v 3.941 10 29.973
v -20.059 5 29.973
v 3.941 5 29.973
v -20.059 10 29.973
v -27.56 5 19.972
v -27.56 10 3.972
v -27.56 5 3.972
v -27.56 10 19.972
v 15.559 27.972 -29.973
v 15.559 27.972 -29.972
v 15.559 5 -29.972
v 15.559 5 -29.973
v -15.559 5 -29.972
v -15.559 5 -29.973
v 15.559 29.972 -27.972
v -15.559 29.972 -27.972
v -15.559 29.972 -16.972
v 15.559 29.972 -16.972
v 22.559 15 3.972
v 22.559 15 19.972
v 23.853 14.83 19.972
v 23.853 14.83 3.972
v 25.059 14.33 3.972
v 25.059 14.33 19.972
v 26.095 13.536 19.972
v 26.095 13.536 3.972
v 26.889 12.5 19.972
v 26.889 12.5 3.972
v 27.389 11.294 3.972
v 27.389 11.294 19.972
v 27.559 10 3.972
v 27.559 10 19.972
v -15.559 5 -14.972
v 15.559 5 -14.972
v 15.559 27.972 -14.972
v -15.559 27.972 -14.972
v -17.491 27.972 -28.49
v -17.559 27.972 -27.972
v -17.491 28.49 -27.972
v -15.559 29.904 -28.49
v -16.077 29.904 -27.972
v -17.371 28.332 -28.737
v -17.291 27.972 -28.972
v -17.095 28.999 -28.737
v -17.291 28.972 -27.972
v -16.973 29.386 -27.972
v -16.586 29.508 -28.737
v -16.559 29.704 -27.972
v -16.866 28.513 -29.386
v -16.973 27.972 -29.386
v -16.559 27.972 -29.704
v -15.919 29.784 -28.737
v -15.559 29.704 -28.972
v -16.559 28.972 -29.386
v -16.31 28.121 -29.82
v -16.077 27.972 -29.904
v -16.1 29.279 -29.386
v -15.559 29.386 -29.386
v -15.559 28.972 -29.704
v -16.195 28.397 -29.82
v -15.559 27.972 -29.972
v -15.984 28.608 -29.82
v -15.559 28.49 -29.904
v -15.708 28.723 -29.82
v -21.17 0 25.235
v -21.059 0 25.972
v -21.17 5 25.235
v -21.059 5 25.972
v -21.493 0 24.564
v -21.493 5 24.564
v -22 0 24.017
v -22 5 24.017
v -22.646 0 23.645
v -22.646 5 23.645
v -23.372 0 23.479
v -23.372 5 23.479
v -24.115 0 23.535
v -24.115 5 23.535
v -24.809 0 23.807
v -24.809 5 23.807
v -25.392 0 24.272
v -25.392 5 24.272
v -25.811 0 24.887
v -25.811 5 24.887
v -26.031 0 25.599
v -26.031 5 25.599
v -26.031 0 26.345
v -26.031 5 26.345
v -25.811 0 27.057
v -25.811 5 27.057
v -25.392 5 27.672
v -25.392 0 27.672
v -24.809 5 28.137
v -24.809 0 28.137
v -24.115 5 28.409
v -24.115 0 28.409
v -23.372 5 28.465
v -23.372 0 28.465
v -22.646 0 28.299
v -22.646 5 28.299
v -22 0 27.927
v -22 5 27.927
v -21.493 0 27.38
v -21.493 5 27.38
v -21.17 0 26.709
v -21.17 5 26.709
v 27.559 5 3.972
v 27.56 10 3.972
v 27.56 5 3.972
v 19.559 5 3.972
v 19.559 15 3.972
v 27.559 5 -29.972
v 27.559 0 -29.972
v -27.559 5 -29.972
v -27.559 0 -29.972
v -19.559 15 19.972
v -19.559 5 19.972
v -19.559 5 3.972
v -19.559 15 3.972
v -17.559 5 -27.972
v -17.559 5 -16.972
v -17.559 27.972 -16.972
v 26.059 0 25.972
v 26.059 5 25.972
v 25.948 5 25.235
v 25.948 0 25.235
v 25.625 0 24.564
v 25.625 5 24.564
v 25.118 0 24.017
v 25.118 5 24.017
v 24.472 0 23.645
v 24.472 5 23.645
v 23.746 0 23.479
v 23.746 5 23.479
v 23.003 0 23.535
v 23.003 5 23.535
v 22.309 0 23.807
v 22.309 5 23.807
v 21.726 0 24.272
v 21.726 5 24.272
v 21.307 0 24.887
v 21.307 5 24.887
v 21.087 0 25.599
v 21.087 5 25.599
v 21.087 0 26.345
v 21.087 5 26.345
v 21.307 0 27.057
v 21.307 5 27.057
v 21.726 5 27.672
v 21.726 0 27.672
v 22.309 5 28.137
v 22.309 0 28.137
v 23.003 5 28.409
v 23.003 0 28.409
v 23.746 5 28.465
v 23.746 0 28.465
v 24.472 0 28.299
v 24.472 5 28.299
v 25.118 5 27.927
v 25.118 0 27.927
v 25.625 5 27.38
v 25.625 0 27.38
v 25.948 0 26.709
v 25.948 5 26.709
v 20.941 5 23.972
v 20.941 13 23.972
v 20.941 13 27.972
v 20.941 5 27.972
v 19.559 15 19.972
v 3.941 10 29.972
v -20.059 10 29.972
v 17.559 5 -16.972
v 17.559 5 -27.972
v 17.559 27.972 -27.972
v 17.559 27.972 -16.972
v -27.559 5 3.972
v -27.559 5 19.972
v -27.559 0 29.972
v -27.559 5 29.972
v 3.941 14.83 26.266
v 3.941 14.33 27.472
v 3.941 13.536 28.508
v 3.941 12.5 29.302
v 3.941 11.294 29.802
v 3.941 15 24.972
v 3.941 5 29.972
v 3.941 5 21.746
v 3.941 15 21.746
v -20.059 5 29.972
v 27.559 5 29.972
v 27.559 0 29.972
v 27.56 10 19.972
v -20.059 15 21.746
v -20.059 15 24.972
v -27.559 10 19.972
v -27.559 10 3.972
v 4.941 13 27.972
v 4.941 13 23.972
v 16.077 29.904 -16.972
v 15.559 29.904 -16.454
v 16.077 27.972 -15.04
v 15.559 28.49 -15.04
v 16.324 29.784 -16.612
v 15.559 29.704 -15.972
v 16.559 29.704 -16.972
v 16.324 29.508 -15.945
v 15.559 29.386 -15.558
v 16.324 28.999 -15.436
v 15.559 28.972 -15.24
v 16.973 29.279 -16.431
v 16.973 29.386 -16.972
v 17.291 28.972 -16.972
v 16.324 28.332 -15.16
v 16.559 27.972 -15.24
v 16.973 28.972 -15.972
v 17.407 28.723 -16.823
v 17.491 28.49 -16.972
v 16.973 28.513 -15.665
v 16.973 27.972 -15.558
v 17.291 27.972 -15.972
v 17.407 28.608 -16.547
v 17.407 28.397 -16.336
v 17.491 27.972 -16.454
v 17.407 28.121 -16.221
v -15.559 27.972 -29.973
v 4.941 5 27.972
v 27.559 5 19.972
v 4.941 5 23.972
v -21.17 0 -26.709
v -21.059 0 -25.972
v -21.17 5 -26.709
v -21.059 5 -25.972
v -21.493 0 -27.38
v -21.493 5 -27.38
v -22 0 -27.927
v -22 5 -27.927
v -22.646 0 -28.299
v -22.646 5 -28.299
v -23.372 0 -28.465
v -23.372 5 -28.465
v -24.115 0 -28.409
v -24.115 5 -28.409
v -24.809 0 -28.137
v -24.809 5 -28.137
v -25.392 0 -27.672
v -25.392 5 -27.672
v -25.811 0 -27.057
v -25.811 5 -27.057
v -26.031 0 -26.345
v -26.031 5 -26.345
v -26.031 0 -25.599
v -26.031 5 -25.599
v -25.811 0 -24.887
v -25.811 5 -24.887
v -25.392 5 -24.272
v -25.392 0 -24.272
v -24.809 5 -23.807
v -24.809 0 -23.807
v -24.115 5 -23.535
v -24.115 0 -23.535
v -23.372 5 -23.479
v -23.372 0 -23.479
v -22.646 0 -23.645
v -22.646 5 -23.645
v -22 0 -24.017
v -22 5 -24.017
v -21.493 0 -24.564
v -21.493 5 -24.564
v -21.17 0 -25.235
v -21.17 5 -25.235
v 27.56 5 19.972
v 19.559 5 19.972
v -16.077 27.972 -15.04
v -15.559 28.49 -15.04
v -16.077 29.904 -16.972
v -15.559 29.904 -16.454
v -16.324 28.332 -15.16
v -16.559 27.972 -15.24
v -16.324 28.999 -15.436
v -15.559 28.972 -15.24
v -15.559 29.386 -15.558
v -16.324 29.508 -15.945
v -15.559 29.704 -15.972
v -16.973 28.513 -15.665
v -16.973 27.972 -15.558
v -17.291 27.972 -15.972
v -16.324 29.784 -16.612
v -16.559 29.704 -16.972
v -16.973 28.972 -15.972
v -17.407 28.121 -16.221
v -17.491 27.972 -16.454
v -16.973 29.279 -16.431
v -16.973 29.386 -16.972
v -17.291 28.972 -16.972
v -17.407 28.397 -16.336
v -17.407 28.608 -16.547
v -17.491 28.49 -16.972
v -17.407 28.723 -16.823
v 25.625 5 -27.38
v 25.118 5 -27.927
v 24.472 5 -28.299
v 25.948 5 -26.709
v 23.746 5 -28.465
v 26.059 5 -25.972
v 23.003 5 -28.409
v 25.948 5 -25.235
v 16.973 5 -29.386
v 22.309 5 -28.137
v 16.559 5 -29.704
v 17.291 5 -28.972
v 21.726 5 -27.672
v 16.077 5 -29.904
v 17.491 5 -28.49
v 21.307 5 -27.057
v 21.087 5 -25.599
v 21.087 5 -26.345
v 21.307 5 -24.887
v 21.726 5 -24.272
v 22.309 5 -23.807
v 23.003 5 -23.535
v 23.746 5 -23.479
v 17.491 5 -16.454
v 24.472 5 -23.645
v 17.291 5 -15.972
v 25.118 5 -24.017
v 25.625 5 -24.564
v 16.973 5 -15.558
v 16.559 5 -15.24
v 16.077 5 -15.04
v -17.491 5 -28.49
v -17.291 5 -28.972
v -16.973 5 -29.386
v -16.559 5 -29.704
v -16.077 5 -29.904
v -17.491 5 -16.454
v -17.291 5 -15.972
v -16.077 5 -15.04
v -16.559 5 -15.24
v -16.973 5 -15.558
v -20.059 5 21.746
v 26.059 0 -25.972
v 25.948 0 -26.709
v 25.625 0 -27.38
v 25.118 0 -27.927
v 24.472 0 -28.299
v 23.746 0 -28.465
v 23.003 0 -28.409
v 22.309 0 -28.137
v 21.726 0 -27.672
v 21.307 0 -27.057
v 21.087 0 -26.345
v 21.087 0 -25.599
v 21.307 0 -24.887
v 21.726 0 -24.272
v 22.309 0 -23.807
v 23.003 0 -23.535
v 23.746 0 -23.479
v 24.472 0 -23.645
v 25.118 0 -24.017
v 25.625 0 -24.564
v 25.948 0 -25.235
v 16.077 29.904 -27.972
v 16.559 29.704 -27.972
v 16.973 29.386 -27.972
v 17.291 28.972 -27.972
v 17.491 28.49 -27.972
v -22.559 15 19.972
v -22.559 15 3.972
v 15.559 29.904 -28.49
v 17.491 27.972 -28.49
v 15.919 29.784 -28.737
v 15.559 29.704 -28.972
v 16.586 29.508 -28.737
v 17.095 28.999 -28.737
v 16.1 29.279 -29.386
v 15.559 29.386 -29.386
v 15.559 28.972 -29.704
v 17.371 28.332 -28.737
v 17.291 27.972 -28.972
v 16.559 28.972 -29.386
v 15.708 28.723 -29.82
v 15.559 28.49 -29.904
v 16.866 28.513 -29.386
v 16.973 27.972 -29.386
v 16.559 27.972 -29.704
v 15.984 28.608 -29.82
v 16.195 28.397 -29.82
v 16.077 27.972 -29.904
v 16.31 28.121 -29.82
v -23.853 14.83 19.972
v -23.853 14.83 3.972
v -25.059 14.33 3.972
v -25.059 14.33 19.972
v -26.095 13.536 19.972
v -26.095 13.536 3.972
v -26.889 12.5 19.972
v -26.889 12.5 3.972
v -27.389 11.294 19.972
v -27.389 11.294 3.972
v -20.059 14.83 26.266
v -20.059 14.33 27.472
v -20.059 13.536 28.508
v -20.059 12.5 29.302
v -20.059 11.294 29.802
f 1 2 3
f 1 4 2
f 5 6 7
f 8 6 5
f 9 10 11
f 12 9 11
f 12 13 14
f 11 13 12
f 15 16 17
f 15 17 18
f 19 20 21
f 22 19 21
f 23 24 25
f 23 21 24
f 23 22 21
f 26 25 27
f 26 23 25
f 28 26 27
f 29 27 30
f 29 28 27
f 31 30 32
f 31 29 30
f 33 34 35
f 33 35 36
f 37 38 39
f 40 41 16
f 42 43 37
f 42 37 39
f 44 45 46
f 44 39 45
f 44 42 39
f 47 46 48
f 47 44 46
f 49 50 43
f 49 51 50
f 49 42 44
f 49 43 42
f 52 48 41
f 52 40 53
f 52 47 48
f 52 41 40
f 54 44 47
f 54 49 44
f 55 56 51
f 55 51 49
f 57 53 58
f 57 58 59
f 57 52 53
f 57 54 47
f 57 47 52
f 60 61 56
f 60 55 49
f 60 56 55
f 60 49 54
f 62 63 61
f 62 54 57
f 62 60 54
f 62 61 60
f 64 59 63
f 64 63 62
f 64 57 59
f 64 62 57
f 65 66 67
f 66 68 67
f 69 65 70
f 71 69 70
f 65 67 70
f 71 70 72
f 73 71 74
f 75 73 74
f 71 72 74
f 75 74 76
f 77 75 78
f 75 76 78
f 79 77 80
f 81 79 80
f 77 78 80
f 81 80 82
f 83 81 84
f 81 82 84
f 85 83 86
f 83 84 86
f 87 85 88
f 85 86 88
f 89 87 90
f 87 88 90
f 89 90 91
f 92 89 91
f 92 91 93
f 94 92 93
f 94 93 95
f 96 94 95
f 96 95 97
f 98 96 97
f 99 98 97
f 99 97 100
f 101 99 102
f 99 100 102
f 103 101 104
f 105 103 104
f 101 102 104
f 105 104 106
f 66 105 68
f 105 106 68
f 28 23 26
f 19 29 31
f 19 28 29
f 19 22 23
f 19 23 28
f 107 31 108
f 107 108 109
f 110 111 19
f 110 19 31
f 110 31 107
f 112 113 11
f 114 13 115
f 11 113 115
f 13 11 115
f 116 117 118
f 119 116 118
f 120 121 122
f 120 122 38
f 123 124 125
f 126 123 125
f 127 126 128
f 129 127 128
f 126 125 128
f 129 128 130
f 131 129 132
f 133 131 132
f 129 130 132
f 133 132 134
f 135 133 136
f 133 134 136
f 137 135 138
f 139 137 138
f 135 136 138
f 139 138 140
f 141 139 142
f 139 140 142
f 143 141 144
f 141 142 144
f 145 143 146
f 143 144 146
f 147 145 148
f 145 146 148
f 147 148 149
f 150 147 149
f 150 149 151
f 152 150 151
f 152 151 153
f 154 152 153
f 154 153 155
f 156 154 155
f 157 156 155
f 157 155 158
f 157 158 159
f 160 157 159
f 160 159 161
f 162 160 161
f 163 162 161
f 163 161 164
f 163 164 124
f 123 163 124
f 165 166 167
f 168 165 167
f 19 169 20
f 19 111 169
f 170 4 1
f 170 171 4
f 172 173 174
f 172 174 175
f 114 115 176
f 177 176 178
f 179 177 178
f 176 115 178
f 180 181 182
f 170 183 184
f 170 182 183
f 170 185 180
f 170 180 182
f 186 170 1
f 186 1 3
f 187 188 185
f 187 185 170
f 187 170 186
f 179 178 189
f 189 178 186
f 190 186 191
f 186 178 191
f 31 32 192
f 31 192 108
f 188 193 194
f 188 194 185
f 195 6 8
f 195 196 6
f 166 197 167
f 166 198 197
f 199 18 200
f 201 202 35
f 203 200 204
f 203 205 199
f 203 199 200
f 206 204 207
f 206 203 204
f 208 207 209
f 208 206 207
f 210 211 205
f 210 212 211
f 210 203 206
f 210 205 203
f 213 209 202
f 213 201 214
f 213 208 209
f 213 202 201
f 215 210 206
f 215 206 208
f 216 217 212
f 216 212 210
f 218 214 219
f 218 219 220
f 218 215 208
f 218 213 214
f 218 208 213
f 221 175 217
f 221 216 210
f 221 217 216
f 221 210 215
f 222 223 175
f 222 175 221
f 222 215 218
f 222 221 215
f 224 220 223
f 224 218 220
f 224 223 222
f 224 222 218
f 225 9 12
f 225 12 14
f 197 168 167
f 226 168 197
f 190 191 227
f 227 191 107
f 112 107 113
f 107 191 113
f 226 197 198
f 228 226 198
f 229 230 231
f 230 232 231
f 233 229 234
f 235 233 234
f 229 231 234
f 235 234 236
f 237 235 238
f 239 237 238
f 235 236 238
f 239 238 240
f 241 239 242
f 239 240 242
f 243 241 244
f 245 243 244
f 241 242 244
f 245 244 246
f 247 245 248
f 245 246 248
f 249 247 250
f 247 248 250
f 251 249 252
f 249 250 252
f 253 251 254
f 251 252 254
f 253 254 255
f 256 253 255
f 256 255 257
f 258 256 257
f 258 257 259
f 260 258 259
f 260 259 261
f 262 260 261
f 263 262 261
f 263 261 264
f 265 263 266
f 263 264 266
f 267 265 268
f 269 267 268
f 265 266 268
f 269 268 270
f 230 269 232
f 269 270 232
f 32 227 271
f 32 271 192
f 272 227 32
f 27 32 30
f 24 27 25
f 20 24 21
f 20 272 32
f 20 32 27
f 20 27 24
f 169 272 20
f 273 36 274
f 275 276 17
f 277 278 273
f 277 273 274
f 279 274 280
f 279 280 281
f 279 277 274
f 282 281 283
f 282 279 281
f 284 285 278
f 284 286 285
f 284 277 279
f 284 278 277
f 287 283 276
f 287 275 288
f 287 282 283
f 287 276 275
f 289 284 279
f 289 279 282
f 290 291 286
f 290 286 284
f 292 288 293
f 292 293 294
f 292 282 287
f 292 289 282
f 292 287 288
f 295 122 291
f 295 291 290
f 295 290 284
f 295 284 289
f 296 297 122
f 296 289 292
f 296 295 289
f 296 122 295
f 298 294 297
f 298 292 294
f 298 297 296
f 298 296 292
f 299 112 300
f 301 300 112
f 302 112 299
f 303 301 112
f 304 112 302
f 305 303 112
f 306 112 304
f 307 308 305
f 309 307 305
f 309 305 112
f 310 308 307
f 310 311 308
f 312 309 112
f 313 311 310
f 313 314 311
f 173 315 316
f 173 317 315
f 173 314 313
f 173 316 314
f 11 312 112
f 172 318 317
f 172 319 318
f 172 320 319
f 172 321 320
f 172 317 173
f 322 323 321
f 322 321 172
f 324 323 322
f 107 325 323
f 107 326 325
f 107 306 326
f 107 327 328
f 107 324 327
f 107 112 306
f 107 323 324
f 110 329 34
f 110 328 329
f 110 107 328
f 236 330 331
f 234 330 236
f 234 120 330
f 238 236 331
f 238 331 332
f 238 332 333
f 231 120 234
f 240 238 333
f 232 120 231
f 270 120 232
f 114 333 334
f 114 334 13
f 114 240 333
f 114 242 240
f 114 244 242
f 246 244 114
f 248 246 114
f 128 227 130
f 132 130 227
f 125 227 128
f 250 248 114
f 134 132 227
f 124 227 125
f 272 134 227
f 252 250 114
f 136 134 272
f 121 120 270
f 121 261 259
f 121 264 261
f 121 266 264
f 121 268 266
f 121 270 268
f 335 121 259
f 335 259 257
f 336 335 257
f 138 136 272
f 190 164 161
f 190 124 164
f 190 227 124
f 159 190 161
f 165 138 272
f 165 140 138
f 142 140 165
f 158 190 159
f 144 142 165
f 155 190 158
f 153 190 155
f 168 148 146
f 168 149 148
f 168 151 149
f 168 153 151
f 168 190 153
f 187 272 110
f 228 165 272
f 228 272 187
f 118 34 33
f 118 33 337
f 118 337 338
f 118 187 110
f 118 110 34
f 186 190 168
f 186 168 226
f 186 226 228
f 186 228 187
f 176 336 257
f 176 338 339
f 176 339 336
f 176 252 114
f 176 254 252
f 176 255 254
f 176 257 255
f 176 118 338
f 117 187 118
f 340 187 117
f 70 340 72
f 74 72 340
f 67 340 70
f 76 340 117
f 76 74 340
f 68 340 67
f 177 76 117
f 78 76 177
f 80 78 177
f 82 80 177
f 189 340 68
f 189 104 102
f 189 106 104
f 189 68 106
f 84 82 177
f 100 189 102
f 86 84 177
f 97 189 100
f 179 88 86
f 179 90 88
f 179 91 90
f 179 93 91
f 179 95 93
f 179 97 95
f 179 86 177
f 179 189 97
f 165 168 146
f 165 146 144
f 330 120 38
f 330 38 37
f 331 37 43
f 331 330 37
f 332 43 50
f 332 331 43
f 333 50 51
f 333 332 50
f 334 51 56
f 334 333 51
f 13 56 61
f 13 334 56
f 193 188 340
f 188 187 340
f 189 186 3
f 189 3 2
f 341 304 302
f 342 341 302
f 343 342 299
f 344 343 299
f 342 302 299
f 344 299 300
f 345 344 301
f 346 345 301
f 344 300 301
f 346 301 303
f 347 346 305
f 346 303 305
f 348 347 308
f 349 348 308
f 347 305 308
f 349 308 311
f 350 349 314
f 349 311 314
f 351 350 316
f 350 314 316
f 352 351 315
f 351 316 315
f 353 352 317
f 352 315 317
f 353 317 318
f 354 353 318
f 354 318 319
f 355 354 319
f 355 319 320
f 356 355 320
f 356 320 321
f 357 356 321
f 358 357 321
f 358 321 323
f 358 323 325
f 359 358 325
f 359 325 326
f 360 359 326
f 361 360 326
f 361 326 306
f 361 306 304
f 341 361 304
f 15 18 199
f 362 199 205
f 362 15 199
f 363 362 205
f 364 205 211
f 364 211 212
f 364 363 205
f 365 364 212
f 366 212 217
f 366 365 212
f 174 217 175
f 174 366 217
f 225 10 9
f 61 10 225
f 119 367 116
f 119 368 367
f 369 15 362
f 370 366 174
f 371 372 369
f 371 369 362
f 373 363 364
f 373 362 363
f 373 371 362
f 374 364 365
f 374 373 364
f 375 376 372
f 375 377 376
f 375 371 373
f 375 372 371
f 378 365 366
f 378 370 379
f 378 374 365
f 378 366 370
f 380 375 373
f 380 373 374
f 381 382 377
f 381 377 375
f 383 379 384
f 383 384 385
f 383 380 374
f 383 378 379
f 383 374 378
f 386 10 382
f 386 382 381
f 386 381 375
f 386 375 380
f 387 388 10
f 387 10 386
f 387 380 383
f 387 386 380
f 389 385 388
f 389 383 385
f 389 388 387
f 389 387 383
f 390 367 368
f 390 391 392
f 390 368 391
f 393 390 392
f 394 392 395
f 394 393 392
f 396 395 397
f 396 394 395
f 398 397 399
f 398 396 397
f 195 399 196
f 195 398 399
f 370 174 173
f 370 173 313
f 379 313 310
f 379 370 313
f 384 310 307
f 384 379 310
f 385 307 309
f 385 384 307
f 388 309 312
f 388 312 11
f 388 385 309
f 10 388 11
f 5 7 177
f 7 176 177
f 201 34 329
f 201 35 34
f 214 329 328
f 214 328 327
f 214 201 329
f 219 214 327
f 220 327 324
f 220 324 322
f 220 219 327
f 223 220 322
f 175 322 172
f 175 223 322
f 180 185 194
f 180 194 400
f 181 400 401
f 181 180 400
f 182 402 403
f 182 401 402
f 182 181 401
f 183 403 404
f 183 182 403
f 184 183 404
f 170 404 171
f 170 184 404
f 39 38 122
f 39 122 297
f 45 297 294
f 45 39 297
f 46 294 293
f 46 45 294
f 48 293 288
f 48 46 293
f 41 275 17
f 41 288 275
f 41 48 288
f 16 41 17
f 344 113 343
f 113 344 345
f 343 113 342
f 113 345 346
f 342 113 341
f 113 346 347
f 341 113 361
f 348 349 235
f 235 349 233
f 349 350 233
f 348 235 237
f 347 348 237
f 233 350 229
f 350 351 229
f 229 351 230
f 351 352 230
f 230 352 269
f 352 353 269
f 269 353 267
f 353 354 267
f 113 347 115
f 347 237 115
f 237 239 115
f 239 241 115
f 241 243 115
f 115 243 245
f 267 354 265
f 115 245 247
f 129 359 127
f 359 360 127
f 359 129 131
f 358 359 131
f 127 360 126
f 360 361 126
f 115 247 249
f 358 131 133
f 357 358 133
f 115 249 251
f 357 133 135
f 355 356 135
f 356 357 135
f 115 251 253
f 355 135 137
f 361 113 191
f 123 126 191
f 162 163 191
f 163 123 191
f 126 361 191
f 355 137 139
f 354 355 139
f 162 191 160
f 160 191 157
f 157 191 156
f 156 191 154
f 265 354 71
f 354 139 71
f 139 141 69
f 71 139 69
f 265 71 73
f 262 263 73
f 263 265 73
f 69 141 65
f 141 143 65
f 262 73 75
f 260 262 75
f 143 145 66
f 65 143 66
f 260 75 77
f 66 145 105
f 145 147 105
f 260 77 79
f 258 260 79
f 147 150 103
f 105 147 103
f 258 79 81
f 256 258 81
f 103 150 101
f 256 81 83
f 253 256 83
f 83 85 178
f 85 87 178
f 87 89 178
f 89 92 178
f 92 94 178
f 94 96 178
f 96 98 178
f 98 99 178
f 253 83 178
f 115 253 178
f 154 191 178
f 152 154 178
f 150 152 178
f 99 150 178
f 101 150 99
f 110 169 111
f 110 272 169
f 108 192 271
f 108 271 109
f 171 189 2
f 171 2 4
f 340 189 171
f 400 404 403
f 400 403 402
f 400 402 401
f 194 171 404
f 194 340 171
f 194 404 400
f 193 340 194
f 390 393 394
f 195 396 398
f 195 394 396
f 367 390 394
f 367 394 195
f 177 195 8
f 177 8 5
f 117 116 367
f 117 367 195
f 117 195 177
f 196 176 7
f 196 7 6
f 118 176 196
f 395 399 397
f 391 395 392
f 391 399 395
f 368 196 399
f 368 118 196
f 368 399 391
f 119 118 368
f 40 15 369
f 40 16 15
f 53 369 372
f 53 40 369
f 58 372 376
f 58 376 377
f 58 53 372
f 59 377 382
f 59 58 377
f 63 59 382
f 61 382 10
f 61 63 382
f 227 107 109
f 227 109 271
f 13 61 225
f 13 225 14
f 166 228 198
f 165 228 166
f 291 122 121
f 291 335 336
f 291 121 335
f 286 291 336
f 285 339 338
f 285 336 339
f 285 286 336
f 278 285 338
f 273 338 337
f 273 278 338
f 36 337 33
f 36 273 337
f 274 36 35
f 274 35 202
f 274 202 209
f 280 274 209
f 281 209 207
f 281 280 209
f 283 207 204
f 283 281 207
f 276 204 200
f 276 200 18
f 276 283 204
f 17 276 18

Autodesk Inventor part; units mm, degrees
ref_plane "YZ Plane" through (0, 0, 0) normal (1, 0, 0) x (0, 1, 0)
ref_plane "XZ Plane" through (0, 0, 0) normal (0, 1, 0) x (-1, 0, 0)
ref_plane "XY Plane" through (0, 0, 0) normal (0, 0, 1) x (1, 0, 0)
sketch "Boceto1" plane through (0, 0, 0) normal (0, 1, 0) x (-1, 0, 0)
  line L0 (27.559, 29.972) -> (-27.559, 29.972)
  line L1 (-27.559, 29.972) -> (-27.559, -29.972)
  line L2 (-27.559, -29.972) -> (27.559, -29.972)
  line L3 (27.559, -29.972) -> (27.559, 29.972)
  point P0 (0, 0)
  point P1 (0, -29.972)
  point P2 (0, 29.972)
  dimension "d0" = 59.944
  dimension "d1" = 55.118
  dimension "d44" = 29.972
  dimension "d45" = 27.559
extrude "Extrusión1" add sketch "Boceto1" along normal blind 5
sketch "Boceto2" plane through (0, 5, 0) normal (0, 1, 0) x (1, 0, 0)
  line L0 (27.559, 29.972) -> (-27.559, 29.972) projected
  line L1 (-17.559, 29.972) -> (17.559, 29.972)
  line L2 (17.559, 29.972) -> (17.559, 14.972)
  line L3 (17.559, 14.972) -> (-17.559, 14.972)
  line L4 (-17.559, 14.972) -> (-17.559, 29.972)
  line L5 (-27.559, 29.972) -> (-27.559, -29.972) projected
  line L6 (27.559, -29.972) -> (27.559, 29.972) projected
  point P0 (0, 0)
  point P1 (17.559, 22.472)
  point P2 (17.559, 29.972)
  dimension "d4" = 10
  dimension "d5" = 10
  dimension "d6" = 15
extrude "Extrusión2" add sketch "Boceto2" along normal blind 24.972
sketch "Boceto3" plane through (0, 5, 0) normal (0, 1, 0) x (1, 0, 0)
  line L0 (-27.559, -29.972) -> (27.559, -29.972) projected
  line L1 (-20.059, -29.972) -> (3.941, -29.972)
  line L2 (3.941, -29.972) -> (3.941, -21.7462)
  line L3 (3.941, -21.7462) -> (-20.059, -21.7462)
  line L4 (-20.059, -21.7462) -> (-20.059, -29.972)
  line L5 (-27.559, 29.972) -> (-27.559, -29.972) projected
  line L6 (-27.559, -19.972) -> (-19.559, -19.972)
  line L7 (-19.559, -19.972) -> (-19.559, -3.972)
  line L8 (-19.559, -3.972) -> (-27.559, -3.972)
  line L9 (-27.559, -3.972) -> (-27.559, -19.972)
  line L10 (27.559, -29.972) -> (27.559, 29.972) projected
  line L11 (27.559, -19.972) -> (19.559, -19.972)
  line L12 (19.559, -19.972) -> (19.559, -3.972)
  line L13 (19.559, -3.972) -> (27.559, -3.972)
  line L14 (27.559, -3.972) -> (27.559, -19.972)
  point P0 (0, 0)
  point P1 (-23.559, -19.972)
  point P2 (-20.059, -25.8591)
  point P3 (23.559, -19.972)
  point P4 (3.941, -29.972)
  dimension "d9" = 10
  dimension "d10" = 7.5
  dimension "d11" = 8
  dimension "d12" = 16
  dimension "d13" = 10
  dimension "d14" = 8
  dimension "d15" = 24
extrude "Extrusión3" add sketch "Boceto3" along normal blind 10
sketch "Boceto4" plane through (0, 5, 0) normal (0, 1, 0) x (1, 0, 0)
  line L0 (4.941, -23.972) -> (20.941, -23.972)
  line L1 (20.941, -23.972) -> (20.941, -27.972)
  line L2 (20.941, -27.972) -> (4.941, -27.972)
  line L3 (4.941, -27.972) -> (4.941, -23.972)
  line L4 (3.941, -29.972) -> (27.559, -29.972) projected
  line L5 (3.941, -29.972) -> (3.941, -21.7462) projected
  point P0 (0, 0)
  point P1 (20.941, -25.972)
  point P2 (4.941, -25.972)
  point P3 (3.941, -25.8591)
  dimension "d18" = 2
  dimension "d19" = 4
  dimension "d20" = 16
  dimension "d21" = 1
extrude "Extrusión4" add sketch "Boceto4" along normal blind 8
fillet "Empalme1" radius 2 1 edges at (0, 29.972, -14.972)
fillet "Empalme2" radius 2 3 edges at (-17.559, 16.486, -14.972) (-17.559, 29.3862, -15.5578) (-17.559, 29.972, -23.472)
fillet "Empalme3" radius 2 3 edges at (17.559, 16.486, -14.972) (17.559, 29.3862, -15.5578) (17.559, 29.972, -23.472)
fillet "Empalme4" radius 2 5 edges at (0, 29.972, -29.972) (-16.9732, 29.3862, -29.972) (-17.559, 16.486, -29.972) (16.9732, 29.3862, -29.972) (17.559, 16.486, -29.972)
fillet "Empalme5" radius 5 1 edges at (-27.559, 15, 11.972)
fillet "Empalme6" radius 5 1 edges at (-8.059, 15, 29.972)
fillet "Empalme7" radius 5 1 edges at (27.559, 15, 11.972)
sketch "Boceto6" plane through (27.559, 0, -29.972) normal (0, 0, -1) x (-1, 0, 0)
  line L0 (12, 27.972) -> (12, 5) projected
  line L1 (47.618, 5) -> (23.618, 5) projected
  line L2 (12, 27.972) -> (43.118, 27.972)
  line L3 (43.118, 27.972) -> (43.118, 5)
  line L4 (43.118, 5) -> (12, 5)
  line L5 (12, 5) -> (12, 27.972)
  line L6 (43.118, 27.972) -> (43.118, 5) projected
  point P0 (27.559, 0)
  point P1 (12, 5)
  dimension "d31" = 0
extrude "Extrusión5" add sketch "Boceto6" along normal blind 0.001
sketch "Boceto7" plane through (-27.559, 0, -29.972) normal (-1, 0, 0) x (0, 0, 1)
  line L0 (33.944, 5) -> (33.944, 15) projected
  line L1 (33.944, 5) -> (49.944, 5) projected
  line L2 (33.944, 10) -> (49.944, 10)
  line L3 (49.944, 10) -> (49.944, 5)
  line L4 (49.944, 5) -> (33.944, 5)
  line L5 (33.944, 5) -> (33.944, 10)
  point P0 (29.972, 0)
extrude "Extrusión6" add sketch "Boceto7" along normal blind 0.001
sketch "Boceto8" plane through (-27.559, 0, 29.972) normal (0, 0, 1) x (1, 0, 0)
  line L0 (7.5, 5) -> (7.5, 15) projected
  line L1 (43.118, 5) -> (12, 5) projected
  line L2 (7.5, 10) -> (31.5, 10)
  line L3 (31.5, 10) -> (31.5, 5)
  line L4 (31.5, 5) -> (7.5, 5)
  line L5 (7.5, 5) -> (7.5, 10)
  line L6 (31.5, 5) -> (31.5, 10) projected
  point P0 (27.559, 0)
  point P1 (12, 5)
  dimension "d36" = 0
extrude "Extrusión7" add sketch "Boceto8" along normal blind 0.001
sketch "Boceto9" plane through (27.559, 0, 29.972) normal (1, 0, 0) x (0, 0, -1)
  line L0 (10, 5) -> (10, 15) projected
  line L1 (26, 5) -> (10, 5) projected
  line L2 (10, 10) -> (26, 10)
  line L3 (26, 10) -> (26, 5)
  line L4 (26, 5) -> (10, 5)
  line L5 (10, 5) -> (10, 10)
  point P0 (29.972, 0)
extrude "Extrusión8" add sketch "Boceto9" along normal blind 0.001
sketch "Boceto10" plane through (0, 5, 0) normal (0, 1, 0) x (1, 0, 0)
  circle A0 centre (-23.559, 25.972) radius 2.5
  line L0 (-27.559, 29.972) -> (-27.559, -3.972) projected
  line L1 (-15.559, 29.972) -> (-27.559, 29.972) projected
  line L2 (0, 36.742) -> (0, -44.1649)
  line L3 (-51.3406, 0) -> (46.1301, 0)
  circle A1 centre (23.559, 25.972) radius 2.5
  circle A2 centre (-23.559, -25.972) radius 2.5
  line L4 (-27.559, -29.972) -> (-27.559, 3.972)
  circle A3 centre (23.559, -25.972) radius 2.5
  point P0 (0, 0)
  point P1 (27.559, 29.972)
  dimension "d41" = 5
  dimension "d42" = 4
  dimension "d43" = 4
extrude "Extrusión9" cut sketch "Boceto10" against normal blind 5
properties part number "Puente H"
